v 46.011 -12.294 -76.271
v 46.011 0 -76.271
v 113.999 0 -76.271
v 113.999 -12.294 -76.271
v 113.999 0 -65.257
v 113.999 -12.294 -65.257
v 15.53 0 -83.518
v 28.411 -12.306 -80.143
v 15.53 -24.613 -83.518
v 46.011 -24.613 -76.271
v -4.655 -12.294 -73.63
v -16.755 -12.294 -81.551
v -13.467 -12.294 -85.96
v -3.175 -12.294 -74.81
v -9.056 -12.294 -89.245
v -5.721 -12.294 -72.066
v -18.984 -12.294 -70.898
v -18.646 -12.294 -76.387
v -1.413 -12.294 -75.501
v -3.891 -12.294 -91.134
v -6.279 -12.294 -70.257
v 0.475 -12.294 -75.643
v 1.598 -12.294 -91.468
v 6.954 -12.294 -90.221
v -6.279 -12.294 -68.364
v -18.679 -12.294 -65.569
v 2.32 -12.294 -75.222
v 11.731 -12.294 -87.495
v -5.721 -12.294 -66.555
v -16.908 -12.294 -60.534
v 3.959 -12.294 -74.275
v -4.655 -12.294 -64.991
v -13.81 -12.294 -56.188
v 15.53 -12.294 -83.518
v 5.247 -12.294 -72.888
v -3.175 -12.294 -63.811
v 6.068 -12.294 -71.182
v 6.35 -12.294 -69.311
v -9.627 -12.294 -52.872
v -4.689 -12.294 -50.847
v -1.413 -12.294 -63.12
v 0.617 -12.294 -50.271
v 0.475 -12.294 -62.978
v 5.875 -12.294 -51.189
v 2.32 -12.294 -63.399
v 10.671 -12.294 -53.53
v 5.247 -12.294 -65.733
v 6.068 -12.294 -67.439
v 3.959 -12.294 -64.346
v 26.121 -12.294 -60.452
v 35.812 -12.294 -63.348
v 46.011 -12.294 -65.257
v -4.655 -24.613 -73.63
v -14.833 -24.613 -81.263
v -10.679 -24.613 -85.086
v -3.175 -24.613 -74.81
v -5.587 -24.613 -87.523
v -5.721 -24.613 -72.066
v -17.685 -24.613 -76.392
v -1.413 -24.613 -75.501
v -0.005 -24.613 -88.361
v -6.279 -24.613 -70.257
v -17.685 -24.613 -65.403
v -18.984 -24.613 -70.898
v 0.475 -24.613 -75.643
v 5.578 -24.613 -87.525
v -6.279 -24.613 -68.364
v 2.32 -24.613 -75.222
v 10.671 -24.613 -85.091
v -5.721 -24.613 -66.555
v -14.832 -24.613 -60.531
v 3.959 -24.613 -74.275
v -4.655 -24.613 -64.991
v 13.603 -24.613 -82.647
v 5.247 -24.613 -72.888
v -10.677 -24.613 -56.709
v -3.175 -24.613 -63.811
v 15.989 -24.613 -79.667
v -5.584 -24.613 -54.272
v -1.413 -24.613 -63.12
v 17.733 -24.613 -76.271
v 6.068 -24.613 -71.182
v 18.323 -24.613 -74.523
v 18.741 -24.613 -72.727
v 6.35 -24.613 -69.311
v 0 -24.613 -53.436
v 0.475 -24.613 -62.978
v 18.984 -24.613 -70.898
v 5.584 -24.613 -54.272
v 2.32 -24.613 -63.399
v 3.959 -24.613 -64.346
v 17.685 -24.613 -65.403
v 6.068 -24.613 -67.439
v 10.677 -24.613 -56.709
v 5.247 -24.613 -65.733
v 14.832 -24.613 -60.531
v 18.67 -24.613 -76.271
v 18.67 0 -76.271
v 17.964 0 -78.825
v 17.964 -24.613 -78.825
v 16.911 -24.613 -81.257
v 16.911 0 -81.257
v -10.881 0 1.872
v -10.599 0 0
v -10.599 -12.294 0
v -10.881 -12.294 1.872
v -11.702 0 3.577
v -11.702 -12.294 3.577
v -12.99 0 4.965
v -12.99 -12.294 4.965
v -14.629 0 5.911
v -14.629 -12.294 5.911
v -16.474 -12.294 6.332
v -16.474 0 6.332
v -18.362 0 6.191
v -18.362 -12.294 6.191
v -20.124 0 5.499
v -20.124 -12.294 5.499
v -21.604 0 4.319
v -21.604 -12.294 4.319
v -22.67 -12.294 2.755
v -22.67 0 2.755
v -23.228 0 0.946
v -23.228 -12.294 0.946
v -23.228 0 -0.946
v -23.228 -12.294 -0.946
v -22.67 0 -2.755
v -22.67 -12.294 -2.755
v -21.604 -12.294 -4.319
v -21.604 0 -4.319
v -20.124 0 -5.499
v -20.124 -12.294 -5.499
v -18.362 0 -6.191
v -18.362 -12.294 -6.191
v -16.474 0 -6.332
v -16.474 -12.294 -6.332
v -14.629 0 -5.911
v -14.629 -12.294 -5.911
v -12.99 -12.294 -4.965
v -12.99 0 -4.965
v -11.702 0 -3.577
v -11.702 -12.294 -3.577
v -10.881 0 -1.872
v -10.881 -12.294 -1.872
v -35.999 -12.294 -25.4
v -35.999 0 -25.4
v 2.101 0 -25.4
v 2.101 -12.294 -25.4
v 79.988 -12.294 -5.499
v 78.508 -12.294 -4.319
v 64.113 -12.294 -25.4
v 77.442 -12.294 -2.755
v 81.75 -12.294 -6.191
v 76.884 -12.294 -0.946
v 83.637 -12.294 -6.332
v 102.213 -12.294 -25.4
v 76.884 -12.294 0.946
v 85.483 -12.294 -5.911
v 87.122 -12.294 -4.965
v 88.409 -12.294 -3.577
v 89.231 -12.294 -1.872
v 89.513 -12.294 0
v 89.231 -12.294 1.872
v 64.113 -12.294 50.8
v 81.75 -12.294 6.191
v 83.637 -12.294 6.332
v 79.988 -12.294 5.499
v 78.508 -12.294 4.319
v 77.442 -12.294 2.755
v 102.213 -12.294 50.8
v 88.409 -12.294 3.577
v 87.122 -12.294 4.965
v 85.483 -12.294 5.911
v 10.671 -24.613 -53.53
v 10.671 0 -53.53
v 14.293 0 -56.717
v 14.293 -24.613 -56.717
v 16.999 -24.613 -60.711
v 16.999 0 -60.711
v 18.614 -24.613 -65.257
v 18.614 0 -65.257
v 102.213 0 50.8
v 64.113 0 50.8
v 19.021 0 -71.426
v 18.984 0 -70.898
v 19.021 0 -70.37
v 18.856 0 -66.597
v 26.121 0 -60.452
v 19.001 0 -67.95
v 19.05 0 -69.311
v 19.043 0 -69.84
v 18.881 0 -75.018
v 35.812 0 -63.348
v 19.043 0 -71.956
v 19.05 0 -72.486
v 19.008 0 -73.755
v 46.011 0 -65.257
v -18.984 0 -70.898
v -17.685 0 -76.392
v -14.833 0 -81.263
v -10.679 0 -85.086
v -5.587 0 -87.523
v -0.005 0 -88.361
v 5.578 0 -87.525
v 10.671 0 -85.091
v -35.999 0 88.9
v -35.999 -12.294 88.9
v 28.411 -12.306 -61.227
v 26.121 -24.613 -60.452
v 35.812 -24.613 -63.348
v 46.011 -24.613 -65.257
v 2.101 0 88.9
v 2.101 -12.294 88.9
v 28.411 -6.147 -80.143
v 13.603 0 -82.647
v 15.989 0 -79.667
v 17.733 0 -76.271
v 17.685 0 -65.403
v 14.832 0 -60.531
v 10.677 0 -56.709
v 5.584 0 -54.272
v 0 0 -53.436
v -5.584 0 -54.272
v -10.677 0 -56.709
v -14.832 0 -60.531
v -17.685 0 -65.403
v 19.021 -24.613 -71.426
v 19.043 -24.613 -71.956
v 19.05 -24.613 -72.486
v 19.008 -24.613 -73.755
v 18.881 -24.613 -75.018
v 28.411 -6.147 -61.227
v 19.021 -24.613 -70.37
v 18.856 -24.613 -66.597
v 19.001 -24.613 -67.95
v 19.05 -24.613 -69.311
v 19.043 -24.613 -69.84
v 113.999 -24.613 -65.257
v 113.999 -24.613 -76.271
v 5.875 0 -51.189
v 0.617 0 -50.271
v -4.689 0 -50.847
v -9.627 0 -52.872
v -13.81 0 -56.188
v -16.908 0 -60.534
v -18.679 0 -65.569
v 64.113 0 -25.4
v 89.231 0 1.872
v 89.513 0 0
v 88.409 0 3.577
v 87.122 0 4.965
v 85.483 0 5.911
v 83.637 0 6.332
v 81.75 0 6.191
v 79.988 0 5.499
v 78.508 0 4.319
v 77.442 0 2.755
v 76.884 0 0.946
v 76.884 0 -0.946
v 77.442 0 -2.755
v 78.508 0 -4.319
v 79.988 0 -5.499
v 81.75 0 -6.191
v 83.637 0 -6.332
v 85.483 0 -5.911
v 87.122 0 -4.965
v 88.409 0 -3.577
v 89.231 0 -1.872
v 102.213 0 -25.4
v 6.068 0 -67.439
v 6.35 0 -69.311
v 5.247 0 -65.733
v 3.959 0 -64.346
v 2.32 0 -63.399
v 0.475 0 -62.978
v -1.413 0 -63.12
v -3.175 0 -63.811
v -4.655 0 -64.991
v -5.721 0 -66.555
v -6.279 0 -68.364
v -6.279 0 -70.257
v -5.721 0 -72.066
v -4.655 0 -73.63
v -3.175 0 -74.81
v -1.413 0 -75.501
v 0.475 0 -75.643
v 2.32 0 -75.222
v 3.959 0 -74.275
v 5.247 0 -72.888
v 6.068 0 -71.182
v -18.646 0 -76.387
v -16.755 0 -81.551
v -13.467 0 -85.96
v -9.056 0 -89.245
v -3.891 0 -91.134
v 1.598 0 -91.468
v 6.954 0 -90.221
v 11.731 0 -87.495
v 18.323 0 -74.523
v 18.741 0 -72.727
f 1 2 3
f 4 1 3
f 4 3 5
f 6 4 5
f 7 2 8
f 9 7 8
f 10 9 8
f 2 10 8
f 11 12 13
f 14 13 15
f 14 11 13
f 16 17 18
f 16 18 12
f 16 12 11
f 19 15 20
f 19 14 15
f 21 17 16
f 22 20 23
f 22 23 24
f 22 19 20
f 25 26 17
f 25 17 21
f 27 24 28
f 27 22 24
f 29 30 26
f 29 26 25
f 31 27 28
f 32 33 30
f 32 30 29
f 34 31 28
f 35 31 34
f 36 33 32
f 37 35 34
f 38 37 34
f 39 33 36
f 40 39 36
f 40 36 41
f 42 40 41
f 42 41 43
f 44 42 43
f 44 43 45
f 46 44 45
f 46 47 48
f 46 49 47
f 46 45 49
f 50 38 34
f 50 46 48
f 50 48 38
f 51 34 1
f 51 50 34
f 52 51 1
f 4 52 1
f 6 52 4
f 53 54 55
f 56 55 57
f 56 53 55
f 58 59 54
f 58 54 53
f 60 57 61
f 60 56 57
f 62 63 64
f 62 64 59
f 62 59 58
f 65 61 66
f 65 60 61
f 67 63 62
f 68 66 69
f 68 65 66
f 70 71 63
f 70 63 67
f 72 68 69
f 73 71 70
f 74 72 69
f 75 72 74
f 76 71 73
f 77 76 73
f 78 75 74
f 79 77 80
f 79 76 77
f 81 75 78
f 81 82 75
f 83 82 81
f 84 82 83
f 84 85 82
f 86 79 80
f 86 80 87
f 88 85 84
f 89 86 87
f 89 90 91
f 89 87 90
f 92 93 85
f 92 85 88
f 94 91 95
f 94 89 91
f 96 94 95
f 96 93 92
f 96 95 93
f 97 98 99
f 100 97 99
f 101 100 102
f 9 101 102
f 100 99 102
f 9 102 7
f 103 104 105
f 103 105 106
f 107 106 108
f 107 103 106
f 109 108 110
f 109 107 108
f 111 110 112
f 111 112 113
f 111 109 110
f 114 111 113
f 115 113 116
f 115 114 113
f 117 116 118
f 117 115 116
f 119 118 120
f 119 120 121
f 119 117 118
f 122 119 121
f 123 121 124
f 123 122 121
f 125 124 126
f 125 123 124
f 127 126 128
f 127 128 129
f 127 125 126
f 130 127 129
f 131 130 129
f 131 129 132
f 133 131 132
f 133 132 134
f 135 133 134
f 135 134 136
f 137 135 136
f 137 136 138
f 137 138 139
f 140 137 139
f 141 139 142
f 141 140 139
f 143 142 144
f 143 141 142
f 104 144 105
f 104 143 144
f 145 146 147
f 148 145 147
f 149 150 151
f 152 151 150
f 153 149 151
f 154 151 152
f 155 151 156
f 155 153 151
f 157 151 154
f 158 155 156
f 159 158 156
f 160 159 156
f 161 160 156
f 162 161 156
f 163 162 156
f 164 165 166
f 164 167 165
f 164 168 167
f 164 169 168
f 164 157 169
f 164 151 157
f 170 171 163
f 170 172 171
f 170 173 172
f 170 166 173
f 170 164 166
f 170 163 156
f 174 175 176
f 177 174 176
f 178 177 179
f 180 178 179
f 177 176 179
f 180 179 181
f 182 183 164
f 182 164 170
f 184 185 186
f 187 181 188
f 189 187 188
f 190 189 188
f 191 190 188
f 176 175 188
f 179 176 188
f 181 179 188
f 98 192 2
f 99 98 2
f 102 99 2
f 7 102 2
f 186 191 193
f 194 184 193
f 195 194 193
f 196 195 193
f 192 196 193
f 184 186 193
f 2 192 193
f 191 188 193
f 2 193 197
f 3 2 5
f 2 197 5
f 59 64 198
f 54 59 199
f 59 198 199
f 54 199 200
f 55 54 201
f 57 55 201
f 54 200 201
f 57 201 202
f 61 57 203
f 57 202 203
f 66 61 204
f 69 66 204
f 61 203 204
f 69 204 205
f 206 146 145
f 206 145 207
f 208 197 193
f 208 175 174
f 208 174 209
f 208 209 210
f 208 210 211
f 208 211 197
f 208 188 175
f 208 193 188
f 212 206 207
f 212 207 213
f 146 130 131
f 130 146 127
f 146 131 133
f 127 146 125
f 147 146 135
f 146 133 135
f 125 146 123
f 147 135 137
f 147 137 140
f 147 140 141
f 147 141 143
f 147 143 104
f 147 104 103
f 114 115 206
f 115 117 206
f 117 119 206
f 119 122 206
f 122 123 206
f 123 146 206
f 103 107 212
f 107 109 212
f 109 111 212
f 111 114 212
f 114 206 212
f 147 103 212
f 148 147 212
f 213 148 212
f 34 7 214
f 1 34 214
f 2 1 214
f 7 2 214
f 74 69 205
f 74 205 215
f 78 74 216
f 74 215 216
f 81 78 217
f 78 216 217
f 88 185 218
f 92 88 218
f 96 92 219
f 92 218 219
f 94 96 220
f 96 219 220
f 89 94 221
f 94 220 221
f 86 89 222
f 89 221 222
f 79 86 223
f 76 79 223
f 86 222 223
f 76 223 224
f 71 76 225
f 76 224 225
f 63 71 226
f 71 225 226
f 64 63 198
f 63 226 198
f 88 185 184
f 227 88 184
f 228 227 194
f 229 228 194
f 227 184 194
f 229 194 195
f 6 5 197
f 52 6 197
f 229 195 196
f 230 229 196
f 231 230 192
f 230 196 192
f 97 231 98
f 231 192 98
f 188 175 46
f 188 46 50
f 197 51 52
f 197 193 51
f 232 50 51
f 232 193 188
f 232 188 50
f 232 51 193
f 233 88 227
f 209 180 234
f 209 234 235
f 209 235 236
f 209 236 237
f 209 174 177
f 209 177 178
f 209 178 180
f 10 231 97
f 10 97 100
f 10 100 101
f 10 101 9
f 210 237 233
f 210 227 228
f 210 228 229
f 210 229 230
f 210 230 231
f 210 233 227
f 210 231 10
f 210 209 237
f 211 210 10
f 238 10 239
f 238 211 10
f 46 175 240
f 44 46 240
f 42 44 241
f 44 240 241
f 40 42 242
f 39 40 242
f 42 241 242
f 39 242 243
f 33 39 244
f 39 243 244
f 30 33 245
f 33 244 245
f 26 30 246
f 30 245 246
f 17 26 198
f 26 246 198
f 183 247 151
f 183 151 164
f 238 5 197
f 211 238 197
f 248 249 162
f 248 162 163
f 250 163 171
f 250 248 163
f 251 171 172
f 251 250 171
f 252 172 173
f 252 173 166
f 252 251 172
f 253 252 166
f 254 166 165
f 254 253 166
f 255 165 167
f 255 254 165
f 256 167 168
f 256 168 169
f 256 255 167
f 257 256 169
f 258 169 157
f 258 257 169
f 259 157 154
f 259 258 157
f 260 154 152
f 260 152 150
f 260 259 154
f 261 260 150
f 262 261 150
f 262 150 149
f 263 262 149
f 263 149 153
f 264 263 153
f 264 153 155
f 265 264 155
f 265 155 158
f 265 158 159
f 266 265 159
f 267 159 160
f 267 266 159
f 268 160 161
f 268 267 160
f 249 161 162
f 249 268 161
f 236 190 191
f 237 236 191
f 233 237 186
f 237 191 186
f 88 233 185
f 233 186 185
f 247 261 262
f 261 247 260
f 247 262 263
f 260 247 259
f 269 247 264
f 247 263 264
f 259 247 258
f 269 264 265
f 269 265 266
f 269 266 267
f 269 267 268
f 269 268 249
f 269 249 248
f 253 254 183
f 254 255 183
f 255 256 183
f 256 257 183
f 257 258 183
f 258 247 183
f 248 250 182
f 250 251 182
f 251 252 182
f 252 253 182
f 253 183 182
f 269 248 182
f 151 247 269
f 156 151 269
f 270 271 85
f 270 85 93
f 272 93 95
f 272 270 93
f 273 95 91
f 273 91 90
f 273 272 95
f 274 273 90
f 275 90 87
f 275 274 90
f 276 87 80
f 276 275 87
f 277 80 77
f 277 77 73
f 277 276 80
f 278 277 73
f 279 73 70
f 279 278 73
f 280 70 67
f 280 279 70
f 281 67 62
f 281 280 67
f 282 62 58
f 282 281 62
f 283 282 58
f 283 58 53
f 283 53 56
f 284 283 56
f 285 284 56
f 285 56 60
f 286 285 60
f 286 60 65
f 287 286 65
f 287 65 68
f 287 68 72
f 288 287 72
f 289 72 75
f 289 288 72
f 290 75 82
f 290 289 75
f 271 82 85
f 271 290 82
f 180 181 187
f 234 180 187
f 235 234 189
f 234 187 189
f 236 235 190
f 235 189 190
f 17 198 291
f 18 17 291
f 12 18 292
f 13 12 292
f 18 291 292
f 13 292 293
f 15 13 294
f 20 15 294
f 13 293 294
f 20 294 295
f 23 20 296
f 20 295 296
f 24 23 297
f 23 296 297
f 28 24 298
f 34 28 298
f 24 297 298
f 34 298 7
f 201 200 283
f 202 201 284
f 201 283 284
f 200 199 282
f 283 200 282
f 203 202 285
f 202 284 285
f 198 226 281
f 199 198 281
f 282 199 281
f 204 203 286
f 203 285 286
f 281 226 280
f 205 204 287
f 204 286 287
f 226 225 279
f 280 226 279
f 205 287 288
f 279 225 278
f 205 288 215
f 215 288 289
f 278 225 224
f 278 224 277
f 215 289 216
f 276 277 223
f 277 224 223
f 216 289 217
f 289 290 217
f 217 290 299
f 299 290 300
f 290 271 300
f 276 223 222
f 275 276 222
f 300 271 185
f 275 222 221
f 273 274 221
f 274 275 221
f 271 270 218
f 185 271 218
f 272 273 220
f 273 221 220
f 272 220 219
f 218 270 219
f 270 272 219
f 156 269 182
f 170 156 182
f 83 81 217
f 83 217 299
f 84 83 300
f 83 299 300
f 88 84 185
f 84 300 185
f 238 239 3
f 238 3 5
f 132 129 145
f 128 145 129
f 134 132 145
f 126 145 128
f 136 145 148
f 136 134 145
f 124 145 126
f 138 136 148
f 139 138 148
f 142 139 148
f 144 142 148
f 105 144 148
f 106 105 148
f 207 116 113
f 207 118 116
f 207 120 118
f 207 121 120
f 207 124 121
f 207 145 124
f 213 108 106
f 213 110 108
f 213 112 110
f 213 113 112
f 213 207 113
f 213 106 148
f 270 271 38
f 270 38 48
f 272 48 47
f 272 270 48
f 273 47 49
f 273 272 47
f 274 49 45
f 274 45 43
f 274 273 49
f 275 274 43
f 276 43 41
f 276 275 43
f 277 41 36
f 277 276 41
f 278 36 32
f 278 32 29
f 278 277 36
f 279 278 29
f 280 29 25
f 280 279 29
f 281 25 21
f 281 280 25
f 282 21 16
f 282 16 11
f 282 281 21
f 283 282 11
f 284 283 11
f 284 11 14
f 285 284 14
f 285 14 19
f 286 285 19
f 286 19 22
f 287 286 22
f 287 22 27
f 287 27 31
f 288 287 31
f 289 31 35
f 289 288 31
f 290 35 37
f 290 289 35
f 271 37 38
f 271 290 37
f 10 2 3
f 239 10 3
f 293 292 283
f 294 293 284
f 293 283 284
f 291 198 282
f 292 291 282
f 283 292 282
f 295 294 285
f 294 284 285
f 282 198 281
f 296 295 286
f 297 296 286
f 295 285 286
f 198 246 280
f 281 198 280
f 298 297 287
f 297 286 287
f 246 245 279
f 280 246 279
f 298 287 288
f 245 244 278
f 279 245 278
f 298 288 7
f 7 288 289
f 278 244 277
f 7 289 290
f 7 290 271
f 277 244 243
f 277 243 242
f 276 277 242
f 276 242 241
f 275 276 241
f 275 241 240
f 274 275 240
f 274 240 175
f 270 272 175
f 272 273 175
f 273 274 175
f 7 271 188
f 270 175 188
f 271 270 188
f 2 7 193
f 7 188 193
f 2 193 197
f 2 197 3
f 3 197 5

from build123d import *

# Parameters (mm, degrees)
F0_W     = 38.1
F0_H     = 114.3
F0_R     = 6.35
F1_DEPTH = 12.2936
F0_H_2   = 76.2
F2_DEPTH = 24.6126


with BuildPart() as f1:
    # F0 (on Front) → F1 (new body)
    with BuildSketch(Plane.XZ):
        with Locations((-16.9488759977, 31.75)):
            Rectangle(F0_W, F0_H)
        with Locations((-16.9488759977, 0)):
            Circle(F0_R, mode=Mode.SUBTRACT)
    extrude(amount=F1_DEPTH)


with BuildPart() as f1b:
    # F0 (on Front) → F1, piece 2 (new body)
    with BuildSketch(Plane.XZ):
        with Locations((83.1626755297, 12.7)):
            Rectangle(F0_W, F0_H_2)
        with Locations((83.1626755297, 0)):
            Circle(F0_R, mode=Mode.SUBTRACT)
    extrude(amount=F1_DEPTH)


with BuildPart() as f1c:
    # F0 (on Front) → F1, piece 3 (new body)
    with BuildSketch(Plane.XZ):
        with BuildLine():
            ThreePointArc((18.9837389297, -70.8980097773), (19.0334275238, -70.1049508984), (19.05, -69.3105097773))
            ThreePointArc((19.05, -69.3105097773), (18.9406359278, -67.2721745126), (18.6137994067, -65.2572429901))
            ThreePointArc((18.6137994067, -65.2572429901), (15.7729984646, -58.6280466047), (10.6713850071, -53.5300141568))
            ThreePointArc((10.6713850071, -53.5300141568), (-9.6273373734, -52.8722350778), (-18.9837389297, -70.8980097773))
            ThreePointArc((-18.9837389297, -70.8980097773), (0, -53.4355097773), (18.9837389297, -70.8980097773))
        make_face()
        with BuildLine():
            ThreePointArc((17.7329124706, -76.2708485126), (18.5538398056, -73.6299459059), (18.9837389297, -70.8980097773))
            ThreePointArc((18.9837389297, -70.8980097773), (0, -53.4355097773), (-18.9837389297, -70.8980097773))
            ThreePointArc((-18.9837389297, -70.8980097773), (-8.2239946562, -86.4938858104), (10.6713850071, -85.0910053979))
            ThreePointArc((10.6713850071, -85.0910053979), (14.871106908, -81.2165031978), (17.7329124706, -76.2708485126))
        make_face()
        with Locations((0, -69.3105097773)):
            Circle(F0_R, mode=Mode.SUBTRACT)
        with BuildLine():
            Line((18.6701288335, -76.2708485126), (17.7329124706, -76.2708485126))
            ThreePointArc((17.7329124706, -76.2708485126), (14.871106908, -81.2165031978), (10.6713850071, -85.0910053979))
            add(Edge.make_bspline(
                [(10.6713850071, -85.0910053979), (12.1969107154, -84.5431198491), (13.8321735998, -84.0204148681), (15.529884584, -83.5184234817)],
                knots=[0, 0, 0, 0, 0.1459300345, 0.1459300345, 0.1459300345, 0.1459300345], degree=3))
            ThreePointArc((15.529884584, -83.5184234817), (17.479761588, -80.0591769754), (18.6701288335, -76.2708485126))
        make_face()
        with BuildLine():
            ThreePointArc((10.6713850071, -85.0910053979), (-8.2239946562, -86.4938858104), (-18.9837389297, -70.8980097773))
            ThreePointArc((-18.9837389297, -70.8980097773), (-6.5422464015, -90.3768907196), (15.529884584, -83.5184234817))
            add(Edge.make_bspline(
                [(10.6713850071, -85.0910053979), (12.1969107154, -84.5431198491), (13.8321735998, -84.0204148681), (15.529884584, -83.5184234817)],
                knots=[0, 0, 0, 0, 0.1459300345, 0.1459300345, 0.1459300345, 0.1459300345], degree=3))
        make_face()
        with BuildLine():
            ThreePointArc((19.05, -72.4855097773), (19.0334275238, -71.6910686563), (18.9837389297, -70.8980097773))
            ThreePointArc((18.9837389297, -70.8980097773), (18.5538398056, -73.6299459059), (17.7329124706, -76.2708485126))
            Line((17.7329124706, -76.2708485126), (18.6701288335, -76.2708485126))
            ThreePointArc((18.6701288335, -76.2708485126), (18.9547943048, -74.3876856002), (19.05, -72.4855097773))
        make_face()
        with BuildLine():
            ThreePointArc((10.6713850071, -53.5300141568), (15.7729984646, -58.6280466047), (18.6137994067, -65.2572429901))
            Line((18.6137994067, -65.2572429901), (46.010632673, -65.2572429901))
            add(Edge.make_bspline(
                [(10.6713850071, -53.5300141568), (15.855355067, -56.5924877327), (28.7587196398, -61.8513925035), (39.4621942281, -64.3479001906), (46.010632673, -65.2572429901)],
                knots=[0, 0, 0, 0, 0.5085766586, 1, 1, 1, 1], degree=3))
        make_face()
        with BuildLine():
            ThreePointArc((18.6137994067, -65.2572429901), (18.9406359278, -67.2721745126), (19.05, -69.3105097773))
            ThreePointArc((19.05, -69.3105097773), (19.0334275238, -70.1049508984), (18.9837389297, -70.8980097773))
            ThreePointArc((18.9837389297, -70.8980097773), (19.0334275238, -71.6910686563), (19.05, -72.4855097773))
            ThreePointArc((19.05, -72.4855097773), (18.9547943048, -74.3876856002), (18.6701288335, -76.2708485126))
            Line((18.6701288335, -76.2708485126), (46.010632673, -76.2708485126))
            Line((46.010632673, -76.2708485126), (113.9992779968, -76.2708485126))
            Line((113.9992779968, -76.2708485126), (113.9992779968, -65.2572429901))
            Line((113.9992779968, -65.2572429901), (46.010632673, -65.2572429901))
            Line((46.010632673, -65.2572429901), (18.6137994067, -65.2572429901))
        make_face()
        with BuildLine():
            Line((46.010632673, -76.2708485126), (18.6701288335, -76.2708485126))
            ThreePointArc((18.6701288335, -76.2708485126), (17.479761588, -80.0591769754), (15.529884584, -83.5184234817))
            add(Edge.make_bspline(
                [(15.529884584, -83.5184234817), (19.680689102, -82.291083767), (30.5102969423, -79.6495257935), (39.5186451666, -77.343375938), (46.010632673, -76.2708485126)],
                knots=[0.1459300345, 0.1459300345, 0.1459300345, 0.1459300345, 0.5027204729, 1, 1, 1, 1], degree=3))
        make_face()
    extrude(amount=F1_DEPTH)


with BuildPart() as f2:
    # F0 (on Front) → F2 (new body)
    with BuildSketch(Plane.XZ):
        with BuildLine():
            ThreePointArc((18.6137994067, -65.2572429901), (18.9406359278, -67.2721745126), (19.05, -69.3105097773))
            ThreePointArc((19.05, -69.3105097773), (19.0334275238, -70.1049508984), (18.9837389297, -70.8980097773))
            ThreePointArc((18.9837389297, -70.8980097773), (19.0334275238, -71.6910686563), (19.05, -72.4855097773))
            ThreePointArc((19.05, -72.4855097773), (18.9547943048, -74.3876856002), (18.6701288335, -76.2708485126))
            Line((18.6701288335, -76.2708485126), (46.010632673, -76.2708485126))
            Line((46.010632673, -76.2708485126), (113.9992779968, -76.2708485126))
            Line((113.9992779968, -76.2708485126), (113.9992779968, -65.2572429901))
            Line((113.9992779968, -65.2572429901), (46.010632673, -65.2572429901))
            Line((46.010632673, -65.2572429901), (18.6137994067, -65.2572429901))
        make_face()
        with BuildLine():
            ThreePointArc((10.6713850071, -53.5300141568), (15.7729984646, -58.6280466047), (18.6137994067, -65.2572429901))
            Line((18.6137994067, -65.2572429901), (46.010632673, -65.2572429901))
            add(Edge.make_bspline(
                [(10.6713850071, -53.5300141568), (15.855355067, -56.5924877327), (28.7587196398, -61.8513925035), (39.4621942281, -64.3479001906), (46.010632673, -65.2572429901)],
                knots=[0, 0, 0, 0, 0.5085766586, 1, 1, 1, 1], degree=3))
        make_face()
        with BuildLine():
            Line((46.010632673, -76.2708485126), (18.6701288335, -76.2708485126))
            ThreePointArc((18.6701288335, -76.2708485126), (17.479761588, -80.0591769754), (15.529884584, -83.5184234817))
            add(Edge.make_bspline(
                [(15.529884584, -83.5184234817), (19.680689102, -82.291083767), (30.5102969423, -79.6495257935), (39.5186451666, -77.343375938), (46.010632673, -76.2708485126)],
                knots=[0.1459300345, 0.1459300345, 0.1459300345, 0.1459300345, 0.5027204729, 1, 1, 1, 1], degree=3))
        make_face()
    extrude(amount=F2_DEPTH)


with BuildPart() as f2b:
    # F0 (on Front) → F2, piece 2 (new body)
    with BuildSketch(Plane.XZ):
        with BuildLine():
            ThreePointArc((17.7329124706, -76.2708485126), (18.5538398056, -73.6299459059), (18.9837389297, -70.8980097773))
            ThreePointArc((18.9837389297, -70.8980097773), (0, -53.4355097773), (-18.9837389297, -70.8980097773))
            ThreePointArc((-18.9837389297, -70.8980097773), (-8.2239946562, -86.4938858104), (10.6713850071, -85.0910053979))
            ThreePointArc((10.6713850071, -85.0910053979), (14.871106908, -81.2165031978), (17.7329124706, -76.2708485126))
        make_face()
        with Locations((0, -69.3105097773)):
            Circle(F0_R, mode=Mode.SUBTRACT)
    extrude(amount=F2_DEPTH)


solid = Compound([f1.part, f1b.part, f1c.part, f2.part, f2b.part])
